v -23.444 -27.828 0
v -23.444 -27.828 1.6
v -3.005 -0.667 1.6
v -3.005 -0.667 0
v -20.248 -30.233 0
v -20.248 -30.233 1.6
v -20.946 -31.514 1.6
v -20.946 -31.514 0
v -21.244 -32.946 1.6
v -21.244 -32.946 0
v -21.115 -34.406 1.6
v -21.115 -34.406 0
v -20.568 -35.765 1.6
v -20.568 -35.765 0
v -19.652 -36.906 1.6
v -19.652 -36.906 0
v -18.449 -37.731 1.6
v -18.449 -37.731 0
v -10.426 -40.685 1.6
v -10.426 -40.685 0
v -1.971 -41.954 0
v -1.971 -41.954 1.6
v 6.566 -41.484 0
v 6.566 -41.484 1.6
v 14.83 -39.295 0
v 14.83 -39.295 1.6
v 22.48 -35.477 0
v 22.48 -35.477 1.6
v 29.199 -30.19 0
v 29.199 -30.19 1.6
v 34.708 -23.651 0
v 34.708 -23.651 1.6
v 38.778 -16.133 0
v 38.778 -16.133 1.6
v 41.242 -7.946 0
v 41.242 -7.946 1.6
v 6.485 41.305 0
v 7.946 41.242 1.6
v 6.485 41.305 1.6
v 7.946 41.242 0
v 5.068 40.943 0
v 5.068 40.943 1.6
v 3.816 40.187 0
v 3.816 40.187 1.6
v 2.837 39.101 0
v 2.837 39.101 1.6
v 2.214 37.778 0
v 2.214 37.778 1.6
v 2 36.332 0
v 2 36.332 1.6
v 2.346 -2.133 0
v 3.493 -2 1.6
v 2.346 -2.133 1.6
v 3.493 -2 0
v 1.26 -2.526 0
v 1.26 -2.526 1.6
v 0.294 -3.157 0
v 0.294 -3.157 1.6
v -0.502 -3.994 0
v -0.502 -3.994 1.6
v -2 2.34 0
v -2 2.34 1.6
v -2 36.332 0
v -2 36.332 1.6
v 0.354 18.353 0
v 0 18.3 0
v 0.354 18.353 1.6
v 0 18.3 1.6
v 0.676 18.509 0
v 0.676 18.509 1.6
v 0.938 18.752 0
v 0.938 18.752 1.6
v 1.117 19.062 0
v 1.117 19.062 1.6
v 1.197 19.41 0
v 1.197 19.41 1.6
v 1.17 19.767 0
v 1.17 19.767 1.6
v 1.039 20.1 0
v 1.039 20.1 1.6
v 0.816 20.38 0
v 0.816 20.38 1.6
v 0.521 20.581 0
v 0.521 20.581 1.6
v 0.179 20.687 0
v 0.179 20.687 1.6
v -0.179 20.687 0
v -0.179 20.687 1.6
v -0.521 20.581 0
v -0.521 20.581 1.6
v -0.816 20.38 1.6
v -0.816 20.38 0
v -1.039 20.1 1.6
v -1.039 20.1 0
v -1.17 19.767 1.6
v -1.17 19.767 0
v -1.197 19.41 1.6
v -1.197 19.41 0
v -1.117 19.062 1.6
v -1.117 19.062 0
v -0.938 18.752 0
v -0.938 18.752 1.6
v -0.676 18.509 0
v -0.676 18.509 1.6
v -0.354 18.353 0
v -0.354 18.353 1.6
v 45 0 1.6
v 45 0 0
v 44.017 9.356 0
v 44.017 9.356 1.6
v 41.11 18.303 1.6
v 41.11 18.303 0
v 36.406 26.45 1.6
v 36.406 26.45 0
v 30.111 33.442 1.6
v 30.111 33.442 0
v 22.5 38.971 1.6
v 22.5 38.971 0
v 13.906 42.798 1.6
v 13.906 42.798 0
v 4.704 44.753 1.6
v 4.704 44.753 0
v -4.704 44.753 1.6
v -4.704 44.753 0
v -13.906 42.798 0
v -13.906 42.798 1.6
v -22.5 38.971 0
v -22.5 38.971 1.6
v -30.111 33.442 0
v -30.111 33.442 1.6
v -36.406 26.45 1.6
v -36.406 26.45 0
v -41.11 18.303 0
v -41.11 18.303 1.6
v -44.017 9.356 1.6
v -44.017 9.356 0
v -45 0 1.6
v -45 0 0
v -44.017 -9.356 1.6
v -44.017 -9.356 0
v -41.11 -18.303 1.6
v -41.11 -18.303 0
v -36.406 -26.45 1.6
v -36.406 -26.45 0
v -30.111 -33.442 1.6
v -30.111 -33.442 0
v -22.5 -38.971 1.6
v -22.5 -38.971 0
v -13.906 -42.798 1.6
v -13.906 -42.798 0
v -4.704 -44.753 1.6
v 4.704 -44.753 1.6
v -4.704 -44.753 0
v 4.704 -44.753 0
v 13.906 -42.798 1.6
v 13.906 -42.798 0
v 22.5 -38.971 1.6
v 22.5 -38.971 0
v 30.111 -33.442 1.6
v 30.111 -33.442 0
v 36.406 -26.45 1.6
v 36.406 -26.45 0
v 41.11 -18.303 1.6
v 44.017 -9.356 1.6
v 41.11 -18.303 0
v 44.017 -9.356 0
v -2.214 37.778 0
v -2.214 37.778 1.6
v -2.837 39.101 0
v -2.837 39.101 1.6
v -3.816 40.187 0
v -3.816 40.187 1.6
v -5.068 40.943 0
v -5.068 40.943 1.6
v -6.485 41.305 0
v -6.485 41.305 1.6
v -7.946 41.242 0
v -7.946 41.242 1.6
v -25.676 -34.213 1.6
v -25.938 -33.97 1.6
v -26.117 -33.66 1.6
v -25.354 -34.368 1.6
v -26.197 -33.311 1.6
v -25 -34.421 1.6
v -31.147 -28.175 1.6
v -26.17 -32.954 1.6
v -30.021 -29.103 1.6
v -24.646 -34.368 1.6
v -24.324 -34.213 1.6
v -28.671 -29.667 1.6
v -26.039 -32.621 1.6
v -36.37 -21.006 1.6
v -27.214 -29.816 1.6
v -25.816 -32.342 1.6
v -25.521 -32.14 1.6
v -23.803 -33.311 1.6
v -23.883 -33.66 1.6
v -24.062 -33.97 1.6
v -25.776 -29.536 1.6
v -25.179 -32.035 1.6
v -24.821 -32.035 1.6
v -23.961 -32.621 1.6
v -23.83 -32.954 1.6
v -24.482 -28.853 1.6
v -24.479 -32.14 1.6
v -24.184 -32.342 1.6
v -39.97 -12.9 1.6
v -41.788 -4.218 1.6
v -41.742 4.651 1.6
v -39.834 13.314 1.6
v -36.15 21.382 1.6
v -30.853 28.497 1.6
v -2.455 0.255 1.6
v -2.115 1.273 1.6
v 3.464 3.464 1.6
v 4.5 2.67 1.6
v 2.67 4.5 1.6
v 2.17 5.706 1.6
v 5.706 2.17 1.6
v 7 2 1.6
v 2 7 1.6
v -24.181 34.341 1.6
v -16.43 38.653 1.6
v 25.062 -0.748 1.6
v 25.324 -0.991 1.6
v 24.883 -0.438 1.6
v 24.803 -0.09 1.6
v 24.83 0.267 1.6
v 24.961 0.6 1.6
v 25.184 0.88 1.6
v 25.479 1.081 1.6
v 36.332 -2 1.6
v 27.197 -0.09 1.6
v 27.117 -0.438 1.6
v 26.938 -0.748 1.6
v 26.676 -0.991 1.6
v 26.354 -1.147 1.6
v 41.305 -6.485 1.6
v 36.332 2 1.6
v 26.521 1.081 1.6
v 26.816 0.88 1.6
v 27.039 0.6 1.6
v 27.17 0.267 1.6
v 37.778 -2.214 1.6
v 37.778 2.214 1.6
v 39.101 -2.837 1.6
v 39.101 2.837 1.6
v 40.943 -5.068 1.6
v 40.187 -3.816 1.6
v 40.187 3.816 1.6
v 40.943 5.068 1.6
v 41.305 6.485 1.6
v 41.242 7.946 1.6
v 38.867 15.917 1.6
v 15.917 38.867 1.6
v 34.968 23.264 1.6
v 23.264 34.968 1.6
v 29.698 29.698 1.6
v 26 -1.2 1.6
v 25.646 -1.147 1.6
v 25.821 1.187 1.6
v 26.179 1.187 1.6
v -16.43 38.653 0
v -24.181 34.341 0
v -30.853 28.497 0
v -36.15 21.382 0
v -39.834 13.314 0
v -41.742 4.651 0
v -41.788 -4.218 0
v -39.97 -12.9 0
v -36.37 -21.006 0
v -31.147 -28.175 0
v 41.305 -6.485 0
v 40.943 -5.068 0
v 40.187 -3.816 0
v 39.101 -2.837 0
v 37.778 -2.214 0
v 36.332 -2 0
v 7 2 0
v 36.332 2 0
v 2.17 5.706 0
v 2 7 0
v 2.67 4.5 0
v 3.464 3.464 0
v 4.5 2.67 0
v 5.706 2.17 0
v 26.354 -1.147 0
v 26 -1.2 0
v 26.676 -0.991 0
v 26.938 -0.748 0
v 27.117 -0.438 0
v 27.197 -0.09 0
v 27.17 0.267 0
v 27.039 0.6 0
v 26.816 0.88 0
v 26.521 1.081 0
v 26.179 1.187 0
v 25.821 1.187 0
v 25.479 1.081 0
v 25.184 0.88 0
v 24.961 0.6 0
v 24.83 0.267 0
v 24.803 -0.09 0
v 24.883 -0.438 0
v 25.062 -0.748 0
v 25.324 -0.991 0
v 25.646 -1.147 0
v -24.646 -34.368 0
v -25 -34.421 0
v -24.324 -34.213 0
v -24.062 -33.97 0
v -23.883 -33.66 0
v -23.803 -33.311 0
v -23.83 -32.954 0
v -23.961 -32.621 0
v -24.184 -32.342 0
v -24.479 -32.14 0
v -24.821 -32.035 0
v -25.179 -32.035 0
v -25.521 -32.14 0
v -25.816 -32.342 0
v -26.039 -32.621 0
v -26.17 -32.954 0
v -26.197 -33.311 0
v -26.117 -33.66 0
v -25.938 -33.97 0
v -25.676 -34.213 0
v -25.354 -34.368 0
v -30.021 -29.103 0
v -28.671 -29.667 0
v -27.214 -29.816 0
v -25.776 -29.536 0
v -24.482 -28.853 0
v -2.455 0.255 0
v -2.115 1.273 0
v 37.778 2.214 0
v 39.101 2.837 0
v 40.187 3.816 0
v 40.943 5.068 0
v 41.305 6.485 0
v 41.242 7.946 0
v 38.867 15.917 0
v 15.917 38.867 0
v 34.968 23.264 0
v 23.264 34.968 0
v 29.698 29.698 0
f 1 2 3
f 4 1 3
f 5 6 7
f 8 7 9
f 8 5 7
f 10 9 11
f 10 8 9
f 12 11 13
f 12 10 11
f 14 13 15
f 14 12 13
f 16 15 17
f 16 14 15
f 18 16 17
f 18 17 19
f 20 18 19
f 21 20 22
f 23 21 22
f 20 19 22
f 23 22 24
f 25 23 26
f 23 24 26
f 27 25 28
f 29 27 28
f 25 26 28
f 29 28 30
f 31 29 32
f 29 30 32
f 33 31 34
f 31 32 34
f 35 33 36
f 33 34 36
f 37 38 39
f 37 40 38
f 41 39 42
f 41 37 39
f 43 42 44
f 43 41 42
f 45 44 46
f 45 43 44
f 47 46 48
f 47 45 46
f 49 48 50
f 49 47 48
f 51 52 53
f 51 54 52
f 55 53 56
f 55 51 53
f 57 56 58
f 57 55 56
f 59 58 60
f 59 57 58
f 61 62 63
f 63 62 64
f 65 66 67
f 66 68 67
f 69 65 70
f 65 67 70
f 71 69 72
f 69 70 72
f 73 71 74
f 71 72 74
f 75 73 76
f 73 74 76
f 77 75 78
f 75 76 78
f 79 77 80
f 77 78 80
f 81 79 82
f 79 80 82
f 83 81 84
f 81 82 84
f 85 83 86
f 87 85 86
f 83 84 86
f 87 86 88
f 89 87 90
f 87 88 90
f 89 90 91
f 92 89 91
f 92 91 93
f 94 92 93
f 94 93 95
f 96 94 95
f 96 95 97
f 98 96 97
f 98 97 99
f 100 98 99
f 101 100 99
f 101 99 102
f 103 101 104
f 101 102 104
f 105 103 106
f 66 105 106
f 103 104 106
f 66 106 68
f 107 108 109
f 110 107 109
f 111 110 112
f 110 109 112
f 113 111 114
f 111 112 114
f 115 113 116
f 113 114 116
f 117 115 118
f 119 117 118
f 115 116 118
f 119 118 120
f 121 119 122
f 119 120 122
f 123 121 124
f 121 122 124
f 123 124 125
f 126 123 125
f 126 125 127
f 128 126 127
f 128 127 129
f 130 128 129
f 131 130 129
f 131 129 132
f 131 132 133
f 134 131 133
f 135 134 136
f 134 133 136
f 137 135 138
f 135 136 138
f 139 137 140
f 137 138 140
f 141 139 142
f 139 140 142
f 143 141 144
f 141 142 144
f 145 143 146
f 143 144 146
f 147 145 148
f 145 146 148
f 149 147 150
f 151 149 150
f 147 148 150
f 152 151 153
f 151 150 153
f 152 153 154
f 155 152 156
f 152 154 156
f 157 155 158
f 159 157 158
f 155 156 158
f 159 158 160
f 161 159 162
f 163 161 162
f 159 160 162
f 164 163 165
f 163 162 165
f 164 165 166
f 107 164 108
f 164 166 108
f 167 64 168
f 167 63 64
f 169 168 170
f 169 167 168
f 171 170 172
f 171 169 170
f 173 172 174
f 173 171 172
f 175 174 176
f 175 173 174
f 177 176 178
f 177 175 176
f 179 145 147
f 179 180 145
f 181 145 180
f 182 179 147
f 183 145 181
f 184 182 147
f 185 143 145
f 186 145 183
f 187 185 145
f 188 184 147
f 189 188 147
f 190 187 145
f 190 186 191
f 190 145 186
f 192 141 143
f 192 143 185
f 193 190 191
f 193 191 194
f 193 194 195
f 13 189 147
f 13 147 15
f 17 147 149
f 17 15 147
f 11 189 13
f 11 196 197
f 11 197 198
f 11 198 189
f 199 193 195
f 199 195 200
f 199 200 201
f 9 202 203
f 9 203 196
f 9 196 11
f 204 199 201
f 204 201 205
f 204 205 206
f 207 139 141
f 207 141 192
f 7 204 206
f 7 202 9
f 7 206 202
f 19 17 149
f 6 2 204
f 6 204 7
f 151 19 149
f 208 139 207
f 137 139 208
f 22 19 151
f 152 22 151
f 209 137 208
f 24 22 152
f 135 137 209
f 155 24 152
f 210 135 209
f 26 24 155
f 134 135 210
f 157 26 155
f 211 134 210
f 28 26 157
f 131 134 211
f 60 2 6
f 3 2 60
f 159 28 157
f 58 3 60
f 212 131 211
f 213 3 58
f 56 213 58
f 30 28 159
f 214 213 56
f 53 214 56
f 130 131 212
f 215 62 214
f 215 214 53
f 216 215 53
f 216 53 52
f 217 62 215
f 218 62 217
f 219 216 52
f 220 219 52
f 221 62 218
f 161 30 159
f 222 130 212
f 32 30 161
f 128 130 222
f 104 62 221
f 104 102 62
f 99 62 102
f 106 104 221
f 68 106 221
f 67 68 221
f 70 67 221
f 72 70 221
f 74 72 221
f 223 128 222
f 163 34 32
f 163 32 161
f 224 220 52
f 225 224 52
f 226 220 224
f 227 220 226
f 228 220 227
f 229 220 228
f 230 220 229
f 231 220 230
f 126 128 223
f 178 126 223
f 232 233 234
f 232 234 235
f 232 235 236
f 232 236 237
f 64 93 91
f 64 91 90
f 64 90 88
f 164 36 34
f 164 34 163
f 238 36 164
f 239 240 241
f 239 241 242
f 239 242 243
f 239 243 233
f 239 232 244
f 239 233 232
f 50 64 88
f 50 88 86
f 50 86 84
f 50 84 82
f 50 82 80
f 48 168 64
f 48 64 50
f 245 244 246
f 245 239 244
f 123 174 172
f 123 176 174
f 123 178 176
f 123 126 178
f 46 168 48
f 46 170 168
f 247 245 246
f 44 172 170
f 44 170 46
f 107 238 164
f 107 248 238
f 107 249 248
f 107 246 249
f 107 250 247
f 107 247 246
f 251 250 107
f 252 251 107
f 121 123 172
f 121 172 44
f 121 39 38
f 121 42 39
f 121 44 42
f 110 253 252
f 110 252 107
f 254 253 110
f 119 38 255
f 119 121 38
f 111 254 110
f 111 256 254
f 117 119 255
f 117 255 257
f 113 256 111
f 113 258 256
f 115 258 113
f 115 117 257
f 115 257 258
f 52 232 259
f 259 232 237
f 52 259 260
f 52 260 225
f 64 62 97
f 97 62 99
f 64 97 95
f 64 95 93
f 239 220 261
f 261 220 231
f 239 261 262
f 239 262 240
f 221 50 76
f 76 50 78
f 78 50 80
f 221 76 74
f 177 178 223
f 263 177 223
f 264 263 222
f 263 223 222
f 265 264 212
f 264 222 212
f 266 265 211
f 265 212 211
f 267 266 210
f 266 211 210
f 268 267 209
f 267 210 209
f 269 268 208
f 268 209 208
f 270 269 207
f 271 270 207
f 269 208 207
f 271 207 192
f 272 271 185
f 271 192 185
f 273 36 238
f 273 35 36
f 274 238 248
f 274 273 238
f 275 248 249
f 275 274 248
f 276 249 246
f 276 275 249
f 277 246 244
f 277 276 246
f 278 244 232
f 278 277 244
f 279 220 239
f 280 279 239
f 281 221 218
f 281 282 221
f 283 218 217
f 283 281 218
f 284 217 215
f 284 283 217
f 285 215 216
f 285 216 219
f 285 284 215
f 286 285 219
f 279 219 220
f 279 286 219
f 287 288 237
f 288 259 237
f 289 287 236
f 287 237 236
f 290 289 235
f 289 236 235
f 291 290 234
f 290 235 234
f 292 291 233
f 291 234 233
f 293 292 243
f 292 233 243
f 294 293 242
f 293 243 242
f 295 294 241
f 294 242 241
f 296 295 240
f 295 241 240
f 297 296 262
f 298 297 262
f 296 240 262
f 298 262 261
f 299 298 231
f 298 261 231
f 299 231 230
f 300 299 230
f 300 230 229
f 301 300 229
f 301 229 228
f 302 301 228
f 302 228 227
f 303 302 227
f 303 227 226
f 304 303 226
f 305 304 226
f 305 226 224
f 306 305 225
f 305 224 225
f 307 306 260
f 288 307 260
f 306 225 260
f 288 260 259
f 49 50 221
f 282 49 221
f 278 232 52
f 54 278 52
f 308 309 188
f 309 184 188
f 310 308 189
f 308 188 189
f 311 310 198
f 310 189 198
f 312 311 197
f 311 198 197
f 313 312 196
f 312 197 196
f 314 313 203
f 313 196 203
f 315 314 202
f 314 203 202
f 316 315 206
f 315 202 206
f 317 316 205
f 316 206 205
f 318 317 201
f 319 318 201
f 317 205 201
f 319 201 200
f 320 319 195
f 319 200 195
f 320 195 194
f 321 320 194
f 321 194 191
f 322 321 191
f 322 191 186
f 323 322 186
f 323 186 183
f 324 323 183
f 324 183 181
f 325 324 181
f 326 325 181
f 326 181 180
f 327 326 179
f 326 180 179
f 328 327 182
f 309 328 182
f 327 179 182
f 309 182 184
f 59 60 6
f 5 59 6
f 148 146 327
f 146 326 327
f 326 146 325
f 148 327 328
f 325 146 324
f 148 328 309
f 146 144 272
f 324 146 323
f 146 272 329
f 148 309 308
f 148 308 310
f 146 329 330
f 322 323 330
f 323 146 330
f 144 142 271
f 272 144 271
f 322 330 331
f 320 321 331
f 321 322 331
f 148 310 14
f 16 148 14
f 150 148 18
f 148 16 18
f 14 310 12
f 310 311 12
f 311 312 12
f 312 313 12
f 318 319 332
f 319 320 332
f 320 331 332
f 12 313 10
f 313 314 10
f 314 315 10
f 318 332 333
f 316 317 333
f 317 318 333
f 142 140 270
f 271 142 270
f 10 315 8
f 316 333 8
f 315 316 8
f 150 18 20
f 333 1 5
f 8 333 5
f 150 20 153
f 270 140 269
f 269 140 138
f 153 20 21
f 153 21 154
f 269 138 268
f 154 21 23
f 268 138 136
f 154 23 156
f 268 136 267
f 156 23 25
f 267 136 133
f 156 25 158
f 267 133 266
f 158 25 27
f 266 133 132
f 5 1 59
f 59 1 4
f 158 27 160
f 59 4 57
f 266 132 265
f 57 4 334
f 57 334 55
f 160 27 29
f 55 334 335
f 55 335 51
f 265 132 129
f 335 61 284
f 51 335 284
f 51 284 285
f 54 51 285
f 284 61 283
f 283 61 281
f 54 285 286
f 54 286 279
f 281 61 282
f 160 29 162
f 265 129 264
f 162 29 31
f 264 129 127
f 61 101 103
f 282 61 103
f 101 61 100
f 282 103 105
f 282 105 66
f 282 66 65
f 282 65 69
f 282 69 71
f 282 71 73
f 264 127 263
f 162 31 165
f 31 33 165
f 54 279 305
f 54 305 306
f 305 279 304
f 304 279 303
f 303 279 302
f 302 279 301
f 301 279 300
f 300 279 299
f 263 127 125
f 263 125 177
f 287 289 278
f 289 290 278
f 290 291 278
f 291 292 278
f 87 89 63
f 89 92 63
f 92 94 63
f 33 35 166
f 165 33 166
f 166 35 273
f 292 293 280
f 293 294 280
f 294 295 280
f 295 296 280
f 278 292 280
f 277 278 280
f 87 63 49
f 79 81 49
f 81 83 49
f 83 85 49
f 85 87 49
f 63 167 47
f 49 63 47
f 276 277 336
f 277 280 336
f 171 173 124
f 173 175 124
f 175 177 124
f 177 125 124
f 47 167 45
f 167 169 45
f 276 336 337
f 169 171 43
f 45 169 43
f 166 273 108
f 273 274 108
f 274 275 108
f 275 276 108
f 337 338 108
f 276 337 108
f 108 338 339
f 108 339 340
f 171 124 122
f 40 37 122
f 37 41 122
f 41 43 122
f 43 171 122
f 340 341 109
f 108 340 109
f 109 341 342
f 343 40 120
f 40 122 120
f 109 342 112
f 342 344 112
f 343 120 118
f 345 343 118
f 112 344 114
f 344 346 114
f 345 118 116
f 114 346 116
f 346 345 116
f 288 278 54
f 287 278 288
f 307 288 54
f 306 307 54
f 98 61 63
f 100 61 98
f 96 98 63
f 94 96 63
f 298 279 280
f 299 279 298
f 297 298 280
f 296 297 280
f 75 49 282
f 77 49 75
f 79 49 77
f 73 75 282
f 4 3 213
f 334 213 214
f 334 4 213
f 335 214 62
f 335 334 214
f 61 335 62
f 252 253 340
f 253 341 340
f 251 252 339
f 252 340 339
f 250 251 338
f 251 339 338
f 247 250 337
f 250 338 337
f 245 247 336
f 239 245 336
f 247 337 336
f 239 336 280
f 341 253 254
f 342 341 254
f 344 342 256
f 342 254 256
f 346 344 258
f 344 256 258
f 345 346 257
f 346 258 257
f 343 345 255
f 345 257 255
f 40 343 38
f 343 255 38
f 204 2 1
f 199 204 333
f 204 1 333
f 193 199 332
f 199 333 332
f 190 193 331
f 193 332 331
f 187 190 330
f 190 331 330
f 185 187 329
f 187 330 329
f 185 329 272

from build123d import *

# Parameters (mm, degrees)
SKETCH5_R                = 45
BOSS_EXTRUDE2_DEPTH      = 1.6
M2_CLEARANCE_HOLE2_D     = 2.4
M2_CLEARANCE_HOLE2_DEPTH = 1.6
M2_CLEARANCE_HOLE2_TIP   = 0.721032743
CUT_EXTRUDE1_DEPTH       = 64.659720389
FILLET1_R                = 5


with BuildPart() as part:
    # Sketch5 → Boss-Extrude2 (new body)
    with BuildSketch(Plane(origin=(0, 0, 0), x_dir=(0, 1, 0), z_dir=(0, 0, 1))):
        with Locations(Location((0, 0, 0), (0, 0, 270))):
            Circle(SKETCH5_R)
    extrude(amount=BOSS_EXTRUDE2_DEPTH)

    # M2 Clearance Hole2
    with Locations(Plane.YX):
        with Locations((-33.221475067, -25), (-42, 26), (0, 26), (19.5, 0)):
            Hole(M2_CLEARANCE_HOLE2_D / 2, depth=M2_CLEARANCE_HOLE2_DEPTH)
            with Locations((0, 0, -(M2_CLEARANCE_HOLE2_DEPTH + M2_CLEARANCE_HOLE2_TIP / 2))):  # 118° drill point
                Cone(0, M2_CLEARANCE_HOLE2_D / 2, M2_CLEARANCE_HOLE2_TIP, mode=Mode.SUBTRACT)

    # Sketch8 → Cut-Extrude1 (cut, through all)
    with BuildSketch(Plane.XY.offset(1.6)):
        with BuildLine():
            Line((-23.401939153, -34.424056262), (-23.627495104, -34.723788317))
            ThreePointArc((-23.627495104, -34.723788317), (18.752644965, -37.58108975), (41.952353927, -2))
            Line((41.952353927, -2), (26, -2))
            Line((26, -2), (0.997983033, -2))
            Line((0.997983033, -2), (-23.401939153, -34.424056262))
        make_face()
        with BuildLine():
            Line((-26.823616798, -32.318625928), (-26.598060847, -32.018893872))
            Line((-26.598060847, -32.018893872), (-2, 0.668460732))
            Line((-2, 0.668460732), (-2, 19.5))
            Line((-2, 19.5), (-2, 41.952353927))
            ThreePointArc((-2, 41.952353927), (-39.833965827, 13.313720987), (-26.823616798, -32.318625928))
        make_face()
        with BuildLine():
            ThreePointArc((41.952353927, 2), (29.69848481, 29.69848481), (2, 41.952353927))
            Line((2, 41.952353927), (2, 19.5))
            Line((2, 19.5), (2, 2))
            Line((2, 2), (26, 2))
            Line((26, 2), (41.952353927, 2))
        make_face()
    extrude(amount=-CUT_EXTRUDE1_DEPTH, mode=Mode.SUBTRACT)

    # Fillet1
    fillet1_edges = [part.edges().sort_by_distance(p)[0] for p in [
        (41.952353927, 2, 0.8),
        (2, 2, 0.8),
        (2, 41.952353927, 0.8),
        (-2, 41.952353927, 0.8),
        (-2, 0.668460732, 0.8),
        (-26.823616798, -32.318625928, 0.8),
        (-23.627495104, -34.723788317, 0.8),
        (0.997983033, -2, 0.8),
        (41.952353927, -2, 0.8),
    ]]
    fillet(fillet1_edges, radius=FILLET1_R)


solid = part.part
